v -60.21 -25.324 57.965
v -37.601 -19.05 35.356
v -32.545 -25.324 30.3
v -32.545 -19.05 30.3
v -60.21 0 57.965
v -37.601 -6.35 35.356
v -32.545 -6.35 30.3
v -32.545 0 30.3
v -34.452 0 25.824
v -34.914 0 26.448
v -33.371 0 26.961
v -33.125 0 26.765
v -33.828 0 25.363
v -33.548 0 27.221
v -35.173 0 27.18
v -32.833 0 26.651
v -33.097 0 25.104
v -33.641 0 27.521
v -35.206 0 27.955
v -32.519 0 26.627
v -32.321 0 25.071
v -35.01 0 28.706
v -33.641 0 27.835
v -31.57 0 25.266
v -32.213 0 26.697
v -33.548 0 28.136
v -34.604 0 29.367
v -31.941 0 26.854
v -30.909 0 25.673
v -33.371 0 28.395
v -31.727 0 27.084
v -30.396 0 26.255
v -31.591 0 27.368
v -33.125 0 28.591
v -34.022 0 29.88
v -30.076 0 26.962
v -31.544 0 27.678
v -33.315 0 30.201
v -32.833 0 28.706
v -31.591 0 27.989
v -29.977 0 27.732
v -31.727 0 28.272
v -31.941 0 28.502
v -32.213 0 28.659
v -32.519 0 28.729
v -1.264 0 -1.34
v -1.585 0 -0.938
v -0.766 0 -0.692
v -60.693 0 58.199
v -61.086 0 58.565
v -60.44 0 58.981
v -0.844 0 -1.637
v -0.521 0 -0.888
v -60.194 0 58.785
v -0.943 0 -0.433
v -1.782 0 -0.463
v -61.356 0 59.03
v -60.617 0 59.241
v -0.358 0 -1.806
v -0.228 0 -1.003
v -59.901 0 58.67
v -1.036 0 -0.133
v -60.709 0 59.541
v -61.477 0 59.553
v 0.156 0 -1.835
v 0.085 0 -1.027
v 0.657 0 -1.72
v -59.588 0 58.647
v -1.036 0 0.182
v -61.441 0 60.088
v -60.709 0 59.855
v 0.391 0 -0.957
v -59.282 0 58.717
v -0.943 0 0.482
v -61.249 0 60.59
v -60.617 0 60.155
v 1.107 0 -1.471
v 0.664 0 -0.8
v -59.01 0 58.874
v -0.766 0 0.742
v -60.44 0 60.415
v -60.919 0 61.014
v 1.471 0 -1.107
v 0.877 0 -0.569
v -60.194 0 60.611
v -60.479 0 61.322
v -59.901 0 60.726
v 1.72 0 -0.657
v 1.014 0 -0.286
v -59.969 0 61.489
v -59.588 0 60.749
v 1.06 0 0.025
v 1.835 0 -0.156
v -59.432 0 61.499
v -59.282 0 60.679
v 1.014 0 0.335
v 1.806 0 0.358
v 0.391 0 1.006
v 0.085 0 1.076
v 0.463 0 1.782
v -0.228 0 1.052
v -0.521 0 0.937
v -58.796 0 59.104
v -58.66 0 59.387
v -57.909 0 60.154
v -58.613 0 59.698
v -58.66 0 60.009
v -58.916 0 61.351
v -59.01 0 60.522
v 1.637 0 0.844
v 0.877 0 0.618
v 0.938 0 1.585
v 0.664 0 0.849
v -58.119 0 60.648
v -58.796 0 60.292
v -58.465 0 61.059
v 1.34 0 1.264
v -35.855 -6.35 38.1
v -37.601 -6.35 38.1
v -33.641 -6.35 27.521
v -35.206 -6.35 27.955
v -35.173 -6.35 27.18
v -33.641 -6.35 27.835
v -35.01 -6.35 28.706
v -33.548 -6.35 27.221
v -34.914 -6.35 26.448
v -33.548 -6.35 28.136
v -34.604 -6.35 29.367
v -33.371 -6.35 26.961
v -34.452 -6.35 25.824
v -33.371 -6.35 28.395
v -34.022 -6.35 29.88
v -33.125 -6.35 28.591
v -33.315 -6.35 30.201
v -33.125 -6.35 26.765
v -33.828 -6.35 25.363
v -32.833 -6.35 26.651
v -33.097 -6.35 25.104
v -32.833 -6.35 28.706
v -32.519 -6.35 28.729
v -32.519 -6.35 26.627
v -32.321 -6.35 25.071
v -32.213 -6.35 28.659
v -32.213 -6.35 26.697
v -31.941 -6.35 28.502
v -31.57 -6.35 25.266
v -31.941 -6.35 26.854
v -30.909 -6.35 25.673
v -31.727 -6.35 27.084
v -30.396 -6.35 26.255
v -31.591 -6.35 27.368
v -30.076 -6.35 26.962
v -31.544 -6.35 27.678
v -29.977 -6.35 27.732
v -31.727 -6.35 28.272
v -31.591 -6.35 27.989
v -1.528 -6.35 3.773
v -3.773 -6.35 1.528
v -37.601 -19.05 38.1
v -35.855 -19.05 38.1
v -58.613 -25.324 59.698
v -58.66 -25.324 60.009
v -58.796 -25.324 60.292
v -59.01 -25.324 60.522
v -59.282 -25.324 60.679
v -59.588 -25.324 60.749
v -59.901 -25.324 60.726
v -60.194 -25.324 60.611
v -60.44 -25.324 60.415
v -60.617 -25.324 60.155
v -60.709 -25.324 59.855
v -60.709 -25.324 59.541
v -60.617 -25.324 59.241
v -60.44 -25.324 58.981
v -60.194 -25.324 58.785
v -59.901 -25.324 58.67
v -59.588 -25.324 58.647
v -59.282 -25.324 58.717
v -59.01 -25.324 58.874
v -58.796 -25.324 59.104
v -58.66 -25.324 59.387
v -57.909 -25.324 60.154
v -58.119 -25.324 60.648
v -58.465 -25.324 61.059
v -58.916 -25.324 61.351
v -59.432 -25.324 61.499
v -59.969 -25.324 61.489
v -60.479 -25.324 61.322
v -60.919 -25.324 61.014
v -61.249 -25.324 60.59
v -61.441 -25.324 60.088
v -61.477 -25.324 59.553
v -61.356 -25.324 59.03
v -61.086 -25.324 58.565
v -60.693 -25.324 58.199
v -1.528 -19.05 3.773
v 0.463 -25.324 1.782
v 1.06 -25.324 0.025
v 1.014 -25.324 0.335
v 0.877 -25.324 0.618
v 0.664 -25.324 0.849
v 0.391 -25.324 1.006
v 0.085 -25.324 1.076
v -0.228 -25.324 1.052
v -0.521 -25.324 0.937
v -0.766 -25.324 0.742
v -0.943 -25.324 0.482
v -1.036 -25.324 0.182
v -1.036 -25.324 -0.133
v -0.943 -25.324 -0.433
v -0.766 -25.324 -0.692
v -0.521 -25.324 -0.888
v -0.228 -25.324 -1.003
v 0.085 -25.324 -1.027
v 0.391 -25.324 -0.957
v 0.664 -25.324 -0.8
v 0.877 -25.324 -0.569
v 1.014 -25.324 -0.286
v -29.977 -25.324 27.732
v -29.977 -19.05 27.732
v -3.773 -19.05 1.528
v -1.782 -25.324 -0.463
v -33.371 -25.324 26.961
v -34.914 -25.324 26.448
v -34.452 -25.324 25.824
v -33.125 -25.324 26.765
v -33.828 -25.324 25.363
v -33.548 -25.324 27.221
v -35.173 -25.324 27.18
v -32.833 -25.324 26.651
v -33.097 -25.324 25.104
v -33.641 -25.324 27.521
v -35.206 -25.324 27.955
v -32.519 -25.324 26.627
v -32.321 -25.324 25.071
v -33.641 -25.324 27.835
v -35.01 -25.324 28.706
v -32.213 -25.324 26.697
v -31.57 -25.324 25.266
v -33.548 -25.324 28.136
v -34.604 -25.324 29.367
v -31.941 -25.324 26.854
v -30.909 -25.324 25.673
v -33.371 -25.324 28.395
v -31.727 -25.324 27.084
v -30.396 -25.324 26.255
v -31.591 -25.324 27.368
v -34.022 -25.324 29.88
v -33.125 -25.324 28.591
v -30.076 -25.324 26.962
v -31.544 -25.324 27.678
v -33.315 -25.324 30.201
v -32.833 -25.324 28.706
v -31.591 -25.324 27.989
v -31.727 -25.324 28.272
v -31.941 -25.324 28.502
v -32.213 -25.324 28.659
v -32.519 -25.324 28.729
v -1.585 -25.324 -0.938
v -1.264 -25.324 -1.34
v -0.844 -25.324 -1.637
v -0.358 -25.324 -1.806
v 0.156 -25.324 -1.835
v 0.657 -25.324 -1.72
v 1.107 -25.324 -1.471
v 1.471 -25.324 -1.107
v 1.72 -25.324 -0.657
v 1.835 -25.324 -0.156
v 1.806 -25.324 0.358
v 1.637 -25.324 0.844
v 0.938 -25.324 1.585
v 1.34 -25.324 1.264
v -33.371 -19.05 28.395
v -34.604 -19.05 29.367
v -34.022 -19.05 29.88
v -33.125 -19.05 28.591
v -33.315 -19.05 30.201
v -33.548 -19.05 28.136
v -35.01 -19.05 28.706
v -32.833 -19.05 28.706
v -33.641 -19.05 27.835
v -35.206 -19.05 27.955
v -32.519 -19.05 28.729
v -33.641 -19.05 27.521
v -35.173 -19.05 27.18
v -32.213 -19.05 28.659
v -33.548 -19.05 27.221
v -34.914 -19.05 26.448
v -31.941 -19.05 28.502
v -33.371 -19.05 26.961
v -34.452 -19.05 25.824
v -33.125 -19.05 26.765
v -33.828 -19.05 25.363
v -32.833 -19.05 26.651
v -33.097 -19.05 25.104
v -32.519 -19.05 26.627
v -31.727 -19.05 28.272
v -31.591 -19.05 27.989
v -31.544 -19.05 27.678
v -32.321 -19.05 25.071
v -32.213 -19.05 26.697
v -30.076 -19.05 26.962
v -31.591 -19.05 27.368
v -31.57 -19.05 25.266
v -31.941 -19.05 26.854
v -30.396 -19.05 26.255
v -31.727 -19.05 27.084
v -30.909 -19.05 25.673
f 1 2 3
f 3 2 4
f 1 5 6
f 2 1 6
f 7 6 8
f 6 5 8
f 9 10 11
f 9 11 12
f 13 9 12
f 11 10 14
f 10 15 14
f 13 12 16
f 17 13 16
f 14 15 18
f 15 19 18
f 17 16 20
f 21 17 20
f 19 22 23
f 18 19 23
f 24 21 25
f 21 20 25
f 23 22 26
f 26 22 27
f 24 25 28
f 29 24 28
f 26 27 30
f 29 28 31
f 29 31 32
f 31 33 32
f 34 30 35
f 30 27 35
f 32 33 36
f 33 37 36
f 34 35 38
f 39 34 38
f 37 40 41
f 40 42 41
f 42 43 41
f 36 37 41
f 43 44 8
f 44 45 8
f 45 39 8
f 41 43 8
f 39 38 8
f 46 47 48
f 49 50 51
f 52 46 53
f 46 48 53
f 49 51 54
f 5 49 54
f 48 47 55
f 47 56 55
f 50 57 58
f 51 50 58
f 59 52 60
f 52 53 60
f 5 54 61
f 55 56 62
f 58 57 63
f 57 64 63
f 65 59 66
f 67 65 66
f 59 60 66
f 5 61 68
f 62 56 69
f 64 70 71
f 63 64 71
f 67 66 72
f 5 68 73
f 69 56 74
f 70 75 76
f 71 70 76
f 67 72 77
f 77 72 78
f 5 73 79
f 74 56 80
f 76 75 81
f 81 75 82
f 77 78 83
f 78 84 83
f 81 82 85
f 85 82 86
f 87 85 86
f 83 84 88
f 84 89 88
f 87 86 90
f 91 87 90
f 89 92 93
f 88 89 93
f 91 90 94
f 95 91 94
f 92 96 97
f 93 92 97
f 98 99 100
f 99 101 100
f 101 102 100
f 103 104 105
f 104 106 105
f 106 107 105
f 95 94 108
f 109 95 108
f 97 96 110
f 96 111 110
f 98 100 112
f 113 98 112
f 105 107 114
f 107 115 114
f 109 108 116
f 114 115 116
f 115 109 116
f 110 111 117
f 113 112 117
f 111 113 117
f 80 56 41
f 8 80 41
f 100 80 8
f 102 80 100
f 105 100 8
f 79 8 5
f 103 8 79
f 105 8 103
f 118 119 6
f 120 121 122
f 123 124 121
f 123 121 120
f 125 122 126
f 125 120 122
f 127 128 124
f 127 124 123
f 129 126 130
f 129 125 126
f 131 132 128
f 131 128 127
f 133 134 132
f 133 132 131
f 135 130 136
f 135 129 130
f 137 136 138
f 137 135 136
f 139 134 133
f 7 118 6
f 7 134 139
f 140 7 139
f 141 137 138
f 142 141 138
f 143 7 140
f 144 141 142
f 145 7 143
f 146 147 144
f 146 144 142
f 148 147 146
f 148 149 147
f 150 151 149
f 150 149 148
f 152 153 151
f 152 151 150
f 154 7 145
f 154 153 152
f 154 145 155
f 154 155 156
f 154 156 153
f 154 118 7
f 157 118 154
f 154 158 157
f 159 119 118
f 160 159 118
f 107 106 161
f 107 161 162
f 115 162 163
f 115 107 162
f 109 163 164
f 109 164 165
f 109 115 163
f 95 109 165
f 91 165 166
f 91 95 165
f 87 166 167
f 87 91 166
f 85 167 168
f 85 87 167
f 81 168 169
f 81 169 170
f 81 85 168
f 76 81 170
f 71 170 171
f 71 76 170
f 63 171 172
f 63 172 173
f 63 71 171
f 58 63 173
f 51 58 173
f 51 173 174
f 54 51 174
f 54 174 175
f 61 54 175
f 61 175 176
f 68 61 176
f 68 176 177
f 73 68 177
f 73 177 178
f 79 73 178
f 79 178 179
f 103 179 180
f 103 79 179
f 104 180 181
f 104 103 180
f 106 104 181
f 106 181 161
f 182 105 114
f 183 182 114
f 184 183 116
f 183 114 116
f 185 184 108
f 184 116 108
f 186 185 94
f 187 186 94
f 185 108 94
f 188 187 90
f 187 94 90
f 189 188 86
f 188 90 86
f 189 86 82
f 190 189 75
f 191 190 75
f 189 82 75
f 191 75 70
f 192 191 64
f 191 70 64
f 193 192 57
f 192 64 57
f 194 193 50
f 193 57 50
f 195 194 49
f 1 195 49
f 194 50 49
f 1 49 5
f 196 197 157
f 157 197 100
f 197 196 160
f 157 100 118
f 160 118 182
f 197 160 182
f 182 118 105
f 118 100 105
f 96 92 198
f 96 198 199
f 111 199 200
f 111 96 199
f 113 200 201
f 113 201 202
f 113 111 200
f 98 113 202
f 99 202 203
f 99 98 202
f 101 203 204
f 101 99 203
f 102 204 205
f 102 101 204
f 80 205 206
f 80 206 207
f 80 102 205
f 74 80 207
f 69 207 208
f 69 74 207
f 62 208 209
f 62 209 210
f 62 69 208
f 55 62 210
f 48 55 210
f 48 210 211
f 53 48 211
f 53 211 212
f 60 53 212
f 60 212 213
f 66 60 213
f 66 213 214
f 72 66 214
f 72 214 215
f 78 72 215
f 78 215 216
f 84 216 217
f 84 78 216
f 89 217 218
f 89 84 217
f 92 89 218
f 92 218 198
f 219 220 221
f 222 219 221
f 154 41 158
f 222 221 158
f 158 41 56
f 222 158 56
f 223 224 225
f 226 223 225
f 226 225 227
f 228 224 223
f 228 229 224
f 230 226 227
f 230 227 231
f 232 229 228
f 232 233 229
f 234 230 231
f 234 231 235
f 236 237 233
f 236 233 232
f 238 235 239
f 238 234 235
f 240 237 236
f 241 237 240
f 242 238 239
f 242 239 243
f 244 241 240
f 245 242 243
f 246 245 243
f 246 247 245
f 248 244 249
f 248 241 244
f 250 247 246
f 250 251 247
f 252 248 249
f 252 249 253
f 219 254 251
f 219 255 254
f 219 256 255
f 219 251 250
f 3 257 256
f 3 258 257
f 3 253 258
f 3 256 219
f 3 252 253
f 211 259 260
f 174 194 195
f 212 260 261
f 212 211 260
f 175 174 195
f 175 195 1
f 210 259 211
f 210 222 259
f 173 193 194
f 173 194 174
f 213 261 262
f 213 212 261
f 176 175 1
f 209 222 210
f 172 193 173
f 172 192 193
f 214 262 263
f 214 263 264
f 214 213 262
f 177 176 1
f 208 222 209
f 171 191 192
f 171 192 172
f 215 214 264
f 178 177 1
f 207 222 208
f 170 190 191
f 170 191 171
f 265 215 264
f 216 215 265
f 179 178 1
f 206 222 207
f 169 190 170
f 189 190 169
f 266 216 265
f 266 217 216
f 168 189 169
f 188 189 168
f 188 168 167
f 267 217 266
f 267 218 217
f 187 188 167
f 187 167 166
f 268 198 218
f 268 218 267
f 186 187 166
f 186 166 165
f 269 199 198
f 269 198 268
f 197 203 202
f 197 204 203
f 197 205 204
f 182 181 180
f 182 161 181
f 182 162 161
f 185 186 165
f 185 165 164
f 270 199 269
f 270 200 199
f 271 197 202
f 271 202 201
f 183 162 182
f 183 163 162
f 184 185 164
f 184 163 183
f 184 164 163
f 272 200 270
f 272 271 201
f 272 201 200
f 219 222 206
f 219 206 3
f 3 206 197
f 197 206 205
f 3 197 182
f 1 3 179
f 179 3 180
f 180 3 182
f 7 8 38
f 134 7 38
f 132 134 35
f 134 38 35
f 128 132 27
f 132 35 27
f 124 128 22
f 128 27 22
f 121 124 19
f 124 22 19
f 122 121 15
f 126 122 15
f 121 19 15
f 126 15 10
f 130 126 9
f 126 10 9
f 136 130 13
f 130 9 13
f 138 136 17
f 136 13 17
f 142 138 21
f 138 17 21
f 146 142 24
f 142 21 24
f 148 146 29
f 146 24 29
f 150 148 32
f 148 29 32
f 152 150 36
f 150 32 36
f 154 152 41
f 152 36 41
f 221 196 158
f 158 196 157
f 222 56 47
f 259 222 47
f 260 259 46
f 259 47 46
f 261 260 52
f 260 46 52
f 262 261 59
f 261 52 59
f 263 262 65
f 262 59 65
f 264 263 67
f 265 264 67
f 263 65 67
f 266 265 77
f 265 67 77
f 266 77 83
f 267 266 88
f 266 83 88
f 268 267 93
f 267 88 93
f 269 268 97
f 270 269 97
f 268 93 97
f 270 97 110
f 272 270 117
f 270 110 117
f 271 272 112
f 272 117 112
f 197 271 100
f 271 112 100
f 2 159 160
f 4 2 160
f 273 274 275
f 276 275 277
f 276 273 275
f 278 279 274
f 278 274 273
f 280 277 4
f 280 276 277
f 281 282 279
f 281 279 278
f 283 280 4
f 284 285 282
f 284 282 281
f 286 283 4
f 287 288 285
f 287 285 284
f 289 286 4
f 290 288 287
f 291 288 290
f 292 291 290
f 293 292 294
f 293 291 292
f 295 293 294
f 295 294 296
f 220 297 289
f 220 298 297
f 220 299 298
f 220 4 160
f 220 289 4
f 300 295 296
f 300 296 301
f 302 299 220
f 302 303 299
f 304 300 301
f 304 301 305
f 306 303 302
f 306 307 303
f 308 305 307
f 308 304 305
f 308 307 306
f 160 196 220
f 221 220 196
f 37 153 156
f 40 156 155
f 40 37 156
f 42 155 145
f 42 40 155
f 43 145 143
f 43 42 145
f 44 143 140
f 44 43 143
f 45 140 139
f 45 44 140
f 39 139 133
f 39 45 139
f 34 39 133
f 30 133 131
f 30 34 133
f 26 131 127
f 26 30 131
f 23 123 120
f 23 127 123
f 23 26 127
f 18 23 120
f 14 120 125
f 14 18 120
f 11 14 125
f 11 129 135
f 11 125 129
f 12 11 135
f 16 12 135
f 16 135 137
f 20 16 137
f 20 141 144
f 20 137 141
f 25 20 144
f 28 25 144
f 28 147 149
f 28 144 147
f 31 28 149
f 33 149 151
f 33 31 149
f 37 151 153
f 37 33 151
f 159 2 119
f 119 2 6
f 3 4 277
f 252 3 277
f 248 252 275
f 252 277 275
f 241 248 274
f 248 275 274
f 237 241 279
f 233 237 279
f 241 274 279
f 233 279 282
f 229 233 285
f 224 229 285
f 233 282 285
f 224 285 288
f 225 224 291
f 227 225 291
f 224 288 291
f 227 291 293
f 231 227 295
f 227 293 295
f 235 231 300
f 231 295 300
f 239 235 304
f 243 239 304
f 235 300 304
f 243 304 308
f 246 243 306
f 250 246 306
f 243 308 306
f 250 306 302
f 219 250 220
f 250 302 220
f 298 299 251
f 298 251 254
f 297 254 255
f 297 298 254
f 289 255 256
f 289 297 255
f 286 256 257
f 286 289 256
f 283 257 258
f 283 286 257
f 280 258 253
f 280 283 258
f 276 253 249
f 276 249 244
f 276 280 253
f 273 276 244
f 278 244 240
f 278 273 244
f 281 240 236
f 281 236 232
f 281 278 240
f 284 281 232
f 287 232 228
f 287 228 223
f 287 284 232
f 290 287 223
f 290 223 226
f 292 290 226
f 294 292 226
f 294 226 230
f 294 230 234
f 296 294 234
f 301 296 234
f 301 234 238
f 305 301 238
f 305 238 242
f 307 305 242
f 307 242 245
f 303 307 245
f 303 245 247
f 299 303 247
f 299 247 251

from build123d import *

# Parameters (mm, degrees)
F0_R     = 1.0540994518
F1_DEPTH = 25.3238
F2_W     = 9.8913477779
F2_H     = 12.7
F3_DEPTH = 38.1
F4_W     = 37.0259946046
F4_H     = 12.7
F5_DEPTH = 25.4


with BuildPart() as f1:
    # F0 (on Front) → F1 (new body)
    with BuildSketch(Plane.XZ):
        with BuildLine():
            Line((-29.976574955, 27.7315109247), (-1.7824433728, -0.4626206574))
            ThreePointArc((-1.7824433728, -0.4626206574), (1.3021371376, -1.3021371376), (0.4626206574, 1.7824433728))
            Line((0.4626206574, 1.7824433728), (-57.9090441295, 60.1541081598))
            ThreePointArc((-57.9090441295, 60.1541081598), (-60.9187704252, 61.0135591282), (-60.2099135505, 57.9648495203))
            Line((-60.2099135505, 57.9648495203), (-32.5449282056, 30.2998641753))
            ThreePointArc((-32.5449282056, 30.2998641753), (-34.4523430384, 25.8240960919), (-29.976574955, 27.7315109247))
        make_face()
        with Locations((-32.5981950693, 27.678244061)):
            Circle(F0_R, mode=Mode.SUBTRACT)
        with Locations((0.0063811123, 0.0245859565)):
            Circle(F0_R, mode=Mode.SUBTRACT)
        with Locations((-59.6669015458, 59.6978686146)):
            Circle(F0_R, mode=Mode.SUBTRACT)
    extrude(amount=F1_DEPTH)

    # F2 (on Top) → F3 (cut)
    with BuildSketch(Plane.XY):
        with Locations((-32.6549597085, -12.7)):
            Rectangle(F2_W, F2_H)
    extrude(amount=F3_DEPTH, mode=Mode.SUBTRACT)

    # F4 (on face) → F5 (cut)
    with BuildSketch(Plane(origin=(1.1225320151, 0, 1.1225320151), x_dir=(0.7071067812, 0, -0.7071067812), z_dir=(0.7071067812, 0, 0.7071067812))):
        with Locations((-22.2613505073, -12.7)):
            Rectangle(F4_W, F4_H)
    extrude(amount=-F5_DEPTH, mode=Mode.SUBTRACT)


solid = f1.part
